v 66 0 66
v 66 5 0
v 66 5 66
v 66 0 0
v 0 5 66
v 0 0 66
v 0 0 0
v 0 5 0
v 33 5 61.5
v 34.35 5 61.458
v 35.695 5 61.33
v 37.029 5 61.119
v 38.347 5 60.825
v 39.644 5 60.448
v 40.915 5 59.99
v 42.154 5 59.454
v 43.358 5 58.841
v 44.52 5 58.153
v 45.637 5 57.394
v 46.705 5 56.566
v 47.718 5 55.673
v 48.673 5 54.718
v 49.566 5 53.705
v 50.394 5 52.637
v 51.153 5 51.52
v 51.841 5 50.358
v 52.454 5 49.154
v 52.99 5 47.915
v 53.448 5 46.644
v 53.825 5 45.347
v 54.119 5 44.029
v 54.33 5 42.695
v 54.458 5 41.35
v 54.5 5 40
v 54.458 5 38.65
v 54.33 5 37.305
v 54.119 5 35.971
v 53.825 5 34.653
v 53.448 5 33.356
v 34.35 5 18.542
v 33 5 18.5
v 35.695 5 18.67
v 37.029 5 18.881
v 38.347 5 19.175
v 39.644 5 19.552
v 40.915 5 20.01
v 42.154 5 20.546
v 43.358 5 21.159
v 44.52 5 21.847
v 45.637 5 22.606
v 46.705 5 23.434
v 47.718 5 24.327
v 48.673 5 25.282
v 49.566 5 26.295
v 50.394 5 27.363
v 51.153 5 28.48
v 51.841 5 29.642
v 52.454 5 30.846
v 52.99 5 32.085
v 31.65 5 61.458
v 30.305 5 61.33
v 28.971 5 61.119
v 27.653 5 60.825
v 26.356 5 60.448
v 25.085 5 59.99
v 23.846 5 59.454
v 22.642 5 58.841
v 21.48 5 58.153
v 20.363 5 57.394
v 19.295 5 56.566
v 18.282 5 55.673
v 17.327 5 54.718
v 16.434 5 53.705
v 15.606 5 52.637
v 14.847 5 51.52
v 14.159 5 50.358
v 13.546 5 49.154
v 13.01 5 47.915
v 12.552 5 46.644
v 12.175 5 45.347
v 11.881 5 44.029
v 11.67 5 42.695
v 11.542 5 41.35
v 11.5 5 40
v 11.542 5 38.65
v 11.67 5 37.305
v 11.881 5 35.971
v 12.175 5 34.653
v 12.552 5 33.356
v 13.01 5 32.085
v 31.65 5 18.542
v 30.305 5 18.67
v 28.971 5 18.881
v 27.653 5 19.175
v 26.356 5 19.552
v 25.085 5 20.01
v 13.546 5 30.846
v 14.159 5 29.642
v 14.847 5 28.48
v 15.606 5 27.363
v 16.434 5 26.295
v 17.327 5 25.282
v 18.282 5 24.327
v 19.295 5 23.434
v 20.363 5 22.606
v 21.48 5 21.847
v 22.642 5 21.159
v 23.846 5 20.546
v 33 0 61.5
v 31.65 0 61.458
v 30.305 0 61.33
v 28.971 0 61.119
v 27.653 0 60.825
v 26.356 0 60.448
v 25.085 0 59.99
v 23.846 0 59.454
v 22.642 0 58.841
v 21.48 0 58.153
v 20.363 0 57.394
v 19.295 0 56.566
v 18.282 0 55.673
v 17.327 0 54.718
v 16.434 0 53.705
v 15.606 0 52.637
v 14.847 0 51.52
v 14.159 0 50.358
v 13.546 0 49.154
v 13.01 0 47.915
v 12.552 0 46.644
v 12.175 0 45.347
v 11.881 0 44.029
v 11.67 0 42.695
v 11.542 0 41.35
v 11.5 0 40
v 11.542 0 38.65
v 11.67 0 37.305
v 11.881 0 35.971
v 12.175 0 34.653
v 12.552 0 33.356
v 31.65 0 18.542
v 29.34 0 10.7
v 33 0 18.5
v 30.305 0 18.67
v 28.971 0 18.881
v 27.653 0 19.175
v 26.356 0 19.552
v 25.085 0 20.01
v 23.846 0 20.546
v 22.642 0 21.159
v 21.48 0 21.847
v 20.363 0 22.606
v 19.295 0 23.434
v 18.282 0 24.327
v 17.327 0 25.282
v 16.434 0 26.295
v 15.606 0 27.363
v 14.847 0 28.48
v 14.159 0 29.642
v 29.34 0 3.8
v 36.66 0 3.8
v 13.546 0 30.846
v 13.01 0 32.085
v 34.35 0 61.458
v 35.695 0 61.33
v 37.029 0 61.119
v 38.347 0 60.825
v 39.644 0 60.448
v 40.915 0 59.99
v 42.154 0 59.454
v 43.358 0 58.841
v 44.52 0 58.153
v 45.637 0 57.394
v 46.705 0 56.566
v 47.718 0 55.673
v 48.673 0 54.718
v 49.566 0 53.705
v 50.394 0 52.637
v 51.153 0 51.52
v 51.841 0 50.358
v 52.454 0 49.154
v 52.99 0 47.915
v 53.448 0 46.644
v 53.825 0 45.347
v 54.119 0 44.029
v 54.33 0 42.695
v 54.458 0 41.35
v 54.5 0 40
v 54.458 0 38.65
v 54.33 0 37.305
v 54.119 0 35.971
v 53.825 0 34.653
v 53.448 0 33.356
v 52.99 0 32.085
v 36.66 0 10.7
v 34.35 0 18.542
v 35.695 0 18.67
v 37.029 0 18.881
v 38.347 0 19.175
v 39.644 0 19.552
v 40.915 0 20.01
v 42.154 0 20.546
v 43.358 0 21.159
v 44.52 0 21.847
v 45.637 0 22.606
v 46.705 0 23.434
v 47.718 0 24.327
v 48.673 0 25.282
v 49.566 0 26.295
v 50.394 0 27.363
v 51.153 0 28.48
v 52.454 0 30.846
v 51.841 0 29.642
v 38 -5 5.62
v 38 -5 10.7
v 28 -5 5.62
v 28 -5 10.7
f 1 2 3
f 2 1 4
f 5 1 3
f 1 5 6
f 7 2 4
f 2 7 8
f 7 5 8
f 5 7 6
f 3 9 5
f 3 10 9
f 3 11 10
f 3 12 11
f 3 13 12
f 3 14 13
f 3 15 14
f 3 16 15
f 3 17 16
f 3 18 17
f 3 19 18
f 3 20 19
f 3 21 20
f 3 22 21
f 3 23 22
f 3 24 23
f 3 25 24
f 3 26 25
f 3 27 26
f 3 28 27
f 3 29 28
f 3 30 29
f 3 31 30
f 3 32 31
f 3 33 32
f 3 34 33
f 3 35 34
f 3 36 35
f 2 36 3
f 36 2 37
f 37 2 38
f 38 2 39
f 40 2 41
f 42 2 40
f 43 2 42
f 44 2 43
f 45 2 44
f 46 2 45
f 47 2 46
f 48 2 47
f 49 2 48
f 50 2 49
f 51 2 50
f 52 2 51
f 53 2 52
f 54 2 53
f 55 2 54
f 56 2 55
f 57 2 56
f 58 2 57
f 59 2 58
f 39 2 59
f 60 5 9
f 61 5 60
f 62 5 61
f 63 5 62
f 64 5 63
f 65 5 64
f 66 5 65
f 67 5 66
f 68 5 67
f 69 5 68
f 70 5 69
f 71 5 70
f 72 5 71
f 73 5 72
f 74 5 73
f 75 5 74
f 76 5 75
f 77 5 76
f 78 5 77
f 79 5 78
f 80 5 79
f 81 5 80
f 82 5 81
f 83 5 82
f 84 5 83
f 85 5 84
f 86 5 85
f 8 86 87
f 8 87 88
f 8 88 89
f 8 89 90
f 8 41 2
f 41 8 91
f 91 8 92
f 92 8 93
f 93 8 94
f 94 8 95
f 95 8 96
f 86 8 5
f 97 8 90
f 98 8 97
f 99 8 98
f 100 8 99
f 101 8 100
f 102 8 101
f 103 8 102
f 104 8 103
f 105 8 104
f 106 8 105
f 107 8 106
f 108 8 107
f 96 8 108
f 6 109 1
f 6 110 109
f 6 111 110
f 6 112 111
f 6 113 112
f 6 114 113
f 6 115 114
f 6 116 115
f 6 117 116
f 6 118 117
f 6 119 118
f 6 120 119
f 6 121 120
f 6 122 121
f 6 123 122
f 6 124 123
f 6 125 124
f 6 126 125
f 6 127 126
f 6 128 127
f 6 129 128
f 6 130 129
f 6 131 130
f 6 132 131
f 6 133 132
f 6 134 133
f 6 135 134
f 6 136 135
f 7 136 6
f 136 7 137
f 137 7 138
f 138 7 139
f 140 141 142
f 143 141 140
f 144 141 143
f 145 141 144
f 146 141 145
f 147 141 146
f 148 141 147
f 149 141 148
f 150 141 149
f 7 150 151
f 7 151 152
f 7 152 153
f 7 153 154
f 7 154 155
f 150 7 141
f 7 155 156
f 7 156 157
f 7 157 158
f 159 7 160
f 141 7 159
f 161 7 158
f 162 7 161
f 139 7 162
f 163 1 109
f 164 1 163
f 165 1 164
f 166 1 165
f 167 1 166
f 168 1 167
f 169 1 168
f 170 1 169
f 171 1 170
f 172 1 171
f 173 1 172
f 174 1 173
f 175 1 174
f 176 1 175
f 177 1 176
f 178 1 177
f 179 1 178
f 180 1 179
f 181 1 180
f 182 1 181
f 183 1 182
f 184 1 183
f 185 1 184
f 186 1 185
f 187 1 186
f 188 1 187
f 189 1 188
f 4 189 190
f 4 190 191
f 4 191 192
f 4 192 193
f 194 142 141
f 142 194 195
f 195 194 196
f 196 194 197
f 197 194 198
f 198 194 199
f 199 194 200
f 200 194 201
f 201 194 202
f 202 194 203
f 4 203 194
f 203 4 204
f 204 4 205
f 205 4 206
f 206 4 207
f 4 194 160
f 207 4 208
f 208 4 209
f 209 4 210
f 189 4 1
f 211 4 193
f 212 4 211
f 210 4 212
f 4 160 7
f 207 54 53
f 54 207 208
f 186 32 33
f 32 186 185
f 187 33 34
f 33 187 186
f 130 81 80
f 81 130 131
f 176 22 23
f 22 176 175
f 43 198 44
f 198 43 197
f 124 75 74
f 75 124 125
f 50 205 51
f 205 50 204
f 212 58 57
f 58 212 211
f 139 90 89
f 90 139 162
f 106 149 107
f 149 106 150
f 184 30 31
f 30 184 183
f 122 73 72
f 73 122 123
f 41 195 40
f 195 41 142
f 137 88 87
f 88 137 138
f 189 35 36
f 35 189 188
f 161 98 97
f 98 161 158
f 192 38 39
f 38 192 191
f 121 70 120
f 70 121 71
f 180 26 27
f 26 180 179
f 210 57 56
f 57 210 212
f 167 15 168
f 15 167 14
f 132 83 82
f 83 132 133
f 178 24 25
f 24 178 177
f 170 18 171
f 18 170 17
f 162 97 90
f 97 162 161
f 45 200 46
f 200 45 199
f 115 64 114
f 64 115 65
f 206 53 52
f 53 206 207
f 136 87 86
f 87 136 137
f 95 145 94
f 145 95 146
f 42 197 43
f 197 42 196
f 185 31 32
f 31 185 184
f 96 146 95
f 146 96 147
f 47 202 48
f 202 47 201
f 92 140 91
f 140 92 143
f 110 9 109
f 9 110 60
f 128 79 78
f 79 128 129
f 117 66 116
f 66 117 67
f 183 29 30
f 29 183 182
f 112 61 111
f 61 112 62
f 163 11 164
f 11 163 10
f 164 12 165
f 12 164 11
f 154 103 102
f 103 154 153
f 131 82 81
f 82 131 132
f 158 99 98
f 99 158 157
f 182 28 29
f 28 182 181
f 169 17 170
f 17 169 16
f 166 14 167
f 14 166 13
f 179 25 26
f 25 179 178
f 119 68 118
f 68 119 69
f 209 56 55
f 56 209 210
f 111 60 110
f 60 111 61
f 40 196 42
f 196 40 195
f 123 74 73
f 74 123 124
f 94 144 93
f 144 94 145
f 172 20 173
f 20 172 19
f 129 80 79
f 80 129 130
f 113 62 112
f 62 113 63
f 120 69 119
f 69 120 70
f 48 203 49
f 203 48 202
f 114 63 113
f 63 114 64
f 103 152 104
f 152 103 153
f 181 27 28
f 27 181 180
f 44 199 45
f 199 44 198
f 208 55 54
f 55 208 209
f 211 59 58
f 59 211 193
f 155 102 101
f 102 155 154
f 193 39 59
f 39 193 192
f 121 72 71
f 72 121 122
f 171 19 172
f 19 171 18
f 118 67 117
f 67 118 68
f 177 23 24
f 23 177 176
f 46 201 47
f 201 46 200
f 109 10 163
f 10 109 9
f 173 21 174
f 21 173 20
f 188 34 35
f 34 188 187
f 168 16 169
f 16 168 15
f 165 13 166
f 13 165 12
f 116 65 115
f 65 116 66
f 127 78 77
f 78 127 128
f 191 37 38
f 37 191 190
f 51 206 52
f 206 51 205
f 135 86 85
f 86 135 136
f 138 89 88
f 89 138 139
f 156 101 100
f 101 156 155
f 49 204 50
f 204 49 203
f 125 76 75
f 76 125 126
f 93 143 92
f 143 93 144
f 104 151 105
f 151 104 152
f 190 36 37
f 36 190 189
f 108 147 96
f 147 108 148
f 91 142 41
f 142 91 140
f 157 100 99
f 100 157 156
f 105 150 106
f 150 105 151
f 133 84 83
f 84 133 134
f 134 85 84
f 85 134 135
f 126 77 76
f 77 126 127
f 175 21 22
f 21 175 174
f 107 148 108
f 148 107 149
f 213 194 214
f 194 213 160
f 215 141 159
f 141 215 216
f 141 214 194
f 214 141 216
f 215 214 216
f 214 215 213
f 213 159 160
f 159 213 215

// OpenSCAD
// file: TinyDoveTail.scad
module CreateTinyDoveTailRAW(
    thickness=0, clearance=0,
    dove_tan=0.268, // tan (15deg) 
    slope_tan=0.364 // tan (20deg)
    )
{
    // based on the T30 top width at around 20mm, 15deg dovetail
    c = clearance;
    
    dove_half_long=5+c;
    dove_depth=5+2*c;
    dove_half_short=dove_half_long - dove_tan*dove_depth;    
    
    dove_profile=[[-dove_half_long,0],[dove_half_long,0],
        [dove_half_short,dove_depth],[-dove_half_short, dove_depth]];
     
    difference(){
        // dovetail body
        linear_extrude(thickness+c)
            polygon(dove_profile);
    
        // cut a slope so model can print without support, 20deg
        slope_recess=dove_depth*slope_tan;
    
        slope_profile=[[0,0],[dove_depth,0], [0,slope_recess]];

        translate([-dove_half_long,0,0])
            rotate([90,0,90])
                linear_extrude(dove_half_long*2)
                    polygon(slope_profile);
    } // end difference
}

// Public
module CreateTinyDoveTail(positive=true, thickness=0)
{
    // negative dovetail is larger
    clearance=positive ? 0 : 0.05;
    // clearance=5;

    // Call the RAW version with default tangent will do
    CreateTinyDoveTailRAW(thickness, clearance);
}

module CreateTinyDoveTailSpacingCube(
    positive=true,thickness){
    // Create a cube space that emcompasses a tinydove.
    // Done by calling the RAW dovetail with 0 tangent (no slope)

    clearance=positive ? 0 : 0.05;

    CreateTinyDoveTailRAW(thickness, clearance, 0, 0);
}

// CreateTinyDoveTail(false, 30);
// main file
include <TinyDoveTail.scad>

Create_Dovetail="positive"; // ["positive","negative","none"]

/* [Hidden] */

width=66;
plate_thickness=5;
will_create_positive=Create_Dovetail=="positive";
will_create_negative=Create_Dovetail=="negative";

// tested code below
t30_top_thickness = 5;
extra_thickness = 1.9;
top_thickness = t30_top_thickness+extra_thickness;

extra_clearance=0;
tight_clearance=0.2 + extra_clearance;
t30_bottom_thickness = 4;
extra_thickness = 1.9;
bottom_thickness = t30_bottom_thickness - tight_clearance;

module CreatePlate()
{
  $fn=100;
  
  difference(){
  cube([width,plate_thickness,width]);
  translate([33,15,40])
    rotate([90,0,0])
    cylinder(h=25,r=21.5);
  }
}

difference() {
    CreatePlate();
    if (will_create_negative) {
      CreateTinyDoveTailSpacingCube(
          positive=false,
          thickness=top_thickness
          );
        
      translate([width/2, 0,bottom_thickness])  
      CreateTinyDoveTail(
          positive=false, 
          thickness=top_thickness);
    } 
}
if (will_create_positive) {
   translate([width/2, -plate_thickness,bottom_thickness])
   CreateTinyDoveTail(positive=true, thickness=top_thickness); 
}
